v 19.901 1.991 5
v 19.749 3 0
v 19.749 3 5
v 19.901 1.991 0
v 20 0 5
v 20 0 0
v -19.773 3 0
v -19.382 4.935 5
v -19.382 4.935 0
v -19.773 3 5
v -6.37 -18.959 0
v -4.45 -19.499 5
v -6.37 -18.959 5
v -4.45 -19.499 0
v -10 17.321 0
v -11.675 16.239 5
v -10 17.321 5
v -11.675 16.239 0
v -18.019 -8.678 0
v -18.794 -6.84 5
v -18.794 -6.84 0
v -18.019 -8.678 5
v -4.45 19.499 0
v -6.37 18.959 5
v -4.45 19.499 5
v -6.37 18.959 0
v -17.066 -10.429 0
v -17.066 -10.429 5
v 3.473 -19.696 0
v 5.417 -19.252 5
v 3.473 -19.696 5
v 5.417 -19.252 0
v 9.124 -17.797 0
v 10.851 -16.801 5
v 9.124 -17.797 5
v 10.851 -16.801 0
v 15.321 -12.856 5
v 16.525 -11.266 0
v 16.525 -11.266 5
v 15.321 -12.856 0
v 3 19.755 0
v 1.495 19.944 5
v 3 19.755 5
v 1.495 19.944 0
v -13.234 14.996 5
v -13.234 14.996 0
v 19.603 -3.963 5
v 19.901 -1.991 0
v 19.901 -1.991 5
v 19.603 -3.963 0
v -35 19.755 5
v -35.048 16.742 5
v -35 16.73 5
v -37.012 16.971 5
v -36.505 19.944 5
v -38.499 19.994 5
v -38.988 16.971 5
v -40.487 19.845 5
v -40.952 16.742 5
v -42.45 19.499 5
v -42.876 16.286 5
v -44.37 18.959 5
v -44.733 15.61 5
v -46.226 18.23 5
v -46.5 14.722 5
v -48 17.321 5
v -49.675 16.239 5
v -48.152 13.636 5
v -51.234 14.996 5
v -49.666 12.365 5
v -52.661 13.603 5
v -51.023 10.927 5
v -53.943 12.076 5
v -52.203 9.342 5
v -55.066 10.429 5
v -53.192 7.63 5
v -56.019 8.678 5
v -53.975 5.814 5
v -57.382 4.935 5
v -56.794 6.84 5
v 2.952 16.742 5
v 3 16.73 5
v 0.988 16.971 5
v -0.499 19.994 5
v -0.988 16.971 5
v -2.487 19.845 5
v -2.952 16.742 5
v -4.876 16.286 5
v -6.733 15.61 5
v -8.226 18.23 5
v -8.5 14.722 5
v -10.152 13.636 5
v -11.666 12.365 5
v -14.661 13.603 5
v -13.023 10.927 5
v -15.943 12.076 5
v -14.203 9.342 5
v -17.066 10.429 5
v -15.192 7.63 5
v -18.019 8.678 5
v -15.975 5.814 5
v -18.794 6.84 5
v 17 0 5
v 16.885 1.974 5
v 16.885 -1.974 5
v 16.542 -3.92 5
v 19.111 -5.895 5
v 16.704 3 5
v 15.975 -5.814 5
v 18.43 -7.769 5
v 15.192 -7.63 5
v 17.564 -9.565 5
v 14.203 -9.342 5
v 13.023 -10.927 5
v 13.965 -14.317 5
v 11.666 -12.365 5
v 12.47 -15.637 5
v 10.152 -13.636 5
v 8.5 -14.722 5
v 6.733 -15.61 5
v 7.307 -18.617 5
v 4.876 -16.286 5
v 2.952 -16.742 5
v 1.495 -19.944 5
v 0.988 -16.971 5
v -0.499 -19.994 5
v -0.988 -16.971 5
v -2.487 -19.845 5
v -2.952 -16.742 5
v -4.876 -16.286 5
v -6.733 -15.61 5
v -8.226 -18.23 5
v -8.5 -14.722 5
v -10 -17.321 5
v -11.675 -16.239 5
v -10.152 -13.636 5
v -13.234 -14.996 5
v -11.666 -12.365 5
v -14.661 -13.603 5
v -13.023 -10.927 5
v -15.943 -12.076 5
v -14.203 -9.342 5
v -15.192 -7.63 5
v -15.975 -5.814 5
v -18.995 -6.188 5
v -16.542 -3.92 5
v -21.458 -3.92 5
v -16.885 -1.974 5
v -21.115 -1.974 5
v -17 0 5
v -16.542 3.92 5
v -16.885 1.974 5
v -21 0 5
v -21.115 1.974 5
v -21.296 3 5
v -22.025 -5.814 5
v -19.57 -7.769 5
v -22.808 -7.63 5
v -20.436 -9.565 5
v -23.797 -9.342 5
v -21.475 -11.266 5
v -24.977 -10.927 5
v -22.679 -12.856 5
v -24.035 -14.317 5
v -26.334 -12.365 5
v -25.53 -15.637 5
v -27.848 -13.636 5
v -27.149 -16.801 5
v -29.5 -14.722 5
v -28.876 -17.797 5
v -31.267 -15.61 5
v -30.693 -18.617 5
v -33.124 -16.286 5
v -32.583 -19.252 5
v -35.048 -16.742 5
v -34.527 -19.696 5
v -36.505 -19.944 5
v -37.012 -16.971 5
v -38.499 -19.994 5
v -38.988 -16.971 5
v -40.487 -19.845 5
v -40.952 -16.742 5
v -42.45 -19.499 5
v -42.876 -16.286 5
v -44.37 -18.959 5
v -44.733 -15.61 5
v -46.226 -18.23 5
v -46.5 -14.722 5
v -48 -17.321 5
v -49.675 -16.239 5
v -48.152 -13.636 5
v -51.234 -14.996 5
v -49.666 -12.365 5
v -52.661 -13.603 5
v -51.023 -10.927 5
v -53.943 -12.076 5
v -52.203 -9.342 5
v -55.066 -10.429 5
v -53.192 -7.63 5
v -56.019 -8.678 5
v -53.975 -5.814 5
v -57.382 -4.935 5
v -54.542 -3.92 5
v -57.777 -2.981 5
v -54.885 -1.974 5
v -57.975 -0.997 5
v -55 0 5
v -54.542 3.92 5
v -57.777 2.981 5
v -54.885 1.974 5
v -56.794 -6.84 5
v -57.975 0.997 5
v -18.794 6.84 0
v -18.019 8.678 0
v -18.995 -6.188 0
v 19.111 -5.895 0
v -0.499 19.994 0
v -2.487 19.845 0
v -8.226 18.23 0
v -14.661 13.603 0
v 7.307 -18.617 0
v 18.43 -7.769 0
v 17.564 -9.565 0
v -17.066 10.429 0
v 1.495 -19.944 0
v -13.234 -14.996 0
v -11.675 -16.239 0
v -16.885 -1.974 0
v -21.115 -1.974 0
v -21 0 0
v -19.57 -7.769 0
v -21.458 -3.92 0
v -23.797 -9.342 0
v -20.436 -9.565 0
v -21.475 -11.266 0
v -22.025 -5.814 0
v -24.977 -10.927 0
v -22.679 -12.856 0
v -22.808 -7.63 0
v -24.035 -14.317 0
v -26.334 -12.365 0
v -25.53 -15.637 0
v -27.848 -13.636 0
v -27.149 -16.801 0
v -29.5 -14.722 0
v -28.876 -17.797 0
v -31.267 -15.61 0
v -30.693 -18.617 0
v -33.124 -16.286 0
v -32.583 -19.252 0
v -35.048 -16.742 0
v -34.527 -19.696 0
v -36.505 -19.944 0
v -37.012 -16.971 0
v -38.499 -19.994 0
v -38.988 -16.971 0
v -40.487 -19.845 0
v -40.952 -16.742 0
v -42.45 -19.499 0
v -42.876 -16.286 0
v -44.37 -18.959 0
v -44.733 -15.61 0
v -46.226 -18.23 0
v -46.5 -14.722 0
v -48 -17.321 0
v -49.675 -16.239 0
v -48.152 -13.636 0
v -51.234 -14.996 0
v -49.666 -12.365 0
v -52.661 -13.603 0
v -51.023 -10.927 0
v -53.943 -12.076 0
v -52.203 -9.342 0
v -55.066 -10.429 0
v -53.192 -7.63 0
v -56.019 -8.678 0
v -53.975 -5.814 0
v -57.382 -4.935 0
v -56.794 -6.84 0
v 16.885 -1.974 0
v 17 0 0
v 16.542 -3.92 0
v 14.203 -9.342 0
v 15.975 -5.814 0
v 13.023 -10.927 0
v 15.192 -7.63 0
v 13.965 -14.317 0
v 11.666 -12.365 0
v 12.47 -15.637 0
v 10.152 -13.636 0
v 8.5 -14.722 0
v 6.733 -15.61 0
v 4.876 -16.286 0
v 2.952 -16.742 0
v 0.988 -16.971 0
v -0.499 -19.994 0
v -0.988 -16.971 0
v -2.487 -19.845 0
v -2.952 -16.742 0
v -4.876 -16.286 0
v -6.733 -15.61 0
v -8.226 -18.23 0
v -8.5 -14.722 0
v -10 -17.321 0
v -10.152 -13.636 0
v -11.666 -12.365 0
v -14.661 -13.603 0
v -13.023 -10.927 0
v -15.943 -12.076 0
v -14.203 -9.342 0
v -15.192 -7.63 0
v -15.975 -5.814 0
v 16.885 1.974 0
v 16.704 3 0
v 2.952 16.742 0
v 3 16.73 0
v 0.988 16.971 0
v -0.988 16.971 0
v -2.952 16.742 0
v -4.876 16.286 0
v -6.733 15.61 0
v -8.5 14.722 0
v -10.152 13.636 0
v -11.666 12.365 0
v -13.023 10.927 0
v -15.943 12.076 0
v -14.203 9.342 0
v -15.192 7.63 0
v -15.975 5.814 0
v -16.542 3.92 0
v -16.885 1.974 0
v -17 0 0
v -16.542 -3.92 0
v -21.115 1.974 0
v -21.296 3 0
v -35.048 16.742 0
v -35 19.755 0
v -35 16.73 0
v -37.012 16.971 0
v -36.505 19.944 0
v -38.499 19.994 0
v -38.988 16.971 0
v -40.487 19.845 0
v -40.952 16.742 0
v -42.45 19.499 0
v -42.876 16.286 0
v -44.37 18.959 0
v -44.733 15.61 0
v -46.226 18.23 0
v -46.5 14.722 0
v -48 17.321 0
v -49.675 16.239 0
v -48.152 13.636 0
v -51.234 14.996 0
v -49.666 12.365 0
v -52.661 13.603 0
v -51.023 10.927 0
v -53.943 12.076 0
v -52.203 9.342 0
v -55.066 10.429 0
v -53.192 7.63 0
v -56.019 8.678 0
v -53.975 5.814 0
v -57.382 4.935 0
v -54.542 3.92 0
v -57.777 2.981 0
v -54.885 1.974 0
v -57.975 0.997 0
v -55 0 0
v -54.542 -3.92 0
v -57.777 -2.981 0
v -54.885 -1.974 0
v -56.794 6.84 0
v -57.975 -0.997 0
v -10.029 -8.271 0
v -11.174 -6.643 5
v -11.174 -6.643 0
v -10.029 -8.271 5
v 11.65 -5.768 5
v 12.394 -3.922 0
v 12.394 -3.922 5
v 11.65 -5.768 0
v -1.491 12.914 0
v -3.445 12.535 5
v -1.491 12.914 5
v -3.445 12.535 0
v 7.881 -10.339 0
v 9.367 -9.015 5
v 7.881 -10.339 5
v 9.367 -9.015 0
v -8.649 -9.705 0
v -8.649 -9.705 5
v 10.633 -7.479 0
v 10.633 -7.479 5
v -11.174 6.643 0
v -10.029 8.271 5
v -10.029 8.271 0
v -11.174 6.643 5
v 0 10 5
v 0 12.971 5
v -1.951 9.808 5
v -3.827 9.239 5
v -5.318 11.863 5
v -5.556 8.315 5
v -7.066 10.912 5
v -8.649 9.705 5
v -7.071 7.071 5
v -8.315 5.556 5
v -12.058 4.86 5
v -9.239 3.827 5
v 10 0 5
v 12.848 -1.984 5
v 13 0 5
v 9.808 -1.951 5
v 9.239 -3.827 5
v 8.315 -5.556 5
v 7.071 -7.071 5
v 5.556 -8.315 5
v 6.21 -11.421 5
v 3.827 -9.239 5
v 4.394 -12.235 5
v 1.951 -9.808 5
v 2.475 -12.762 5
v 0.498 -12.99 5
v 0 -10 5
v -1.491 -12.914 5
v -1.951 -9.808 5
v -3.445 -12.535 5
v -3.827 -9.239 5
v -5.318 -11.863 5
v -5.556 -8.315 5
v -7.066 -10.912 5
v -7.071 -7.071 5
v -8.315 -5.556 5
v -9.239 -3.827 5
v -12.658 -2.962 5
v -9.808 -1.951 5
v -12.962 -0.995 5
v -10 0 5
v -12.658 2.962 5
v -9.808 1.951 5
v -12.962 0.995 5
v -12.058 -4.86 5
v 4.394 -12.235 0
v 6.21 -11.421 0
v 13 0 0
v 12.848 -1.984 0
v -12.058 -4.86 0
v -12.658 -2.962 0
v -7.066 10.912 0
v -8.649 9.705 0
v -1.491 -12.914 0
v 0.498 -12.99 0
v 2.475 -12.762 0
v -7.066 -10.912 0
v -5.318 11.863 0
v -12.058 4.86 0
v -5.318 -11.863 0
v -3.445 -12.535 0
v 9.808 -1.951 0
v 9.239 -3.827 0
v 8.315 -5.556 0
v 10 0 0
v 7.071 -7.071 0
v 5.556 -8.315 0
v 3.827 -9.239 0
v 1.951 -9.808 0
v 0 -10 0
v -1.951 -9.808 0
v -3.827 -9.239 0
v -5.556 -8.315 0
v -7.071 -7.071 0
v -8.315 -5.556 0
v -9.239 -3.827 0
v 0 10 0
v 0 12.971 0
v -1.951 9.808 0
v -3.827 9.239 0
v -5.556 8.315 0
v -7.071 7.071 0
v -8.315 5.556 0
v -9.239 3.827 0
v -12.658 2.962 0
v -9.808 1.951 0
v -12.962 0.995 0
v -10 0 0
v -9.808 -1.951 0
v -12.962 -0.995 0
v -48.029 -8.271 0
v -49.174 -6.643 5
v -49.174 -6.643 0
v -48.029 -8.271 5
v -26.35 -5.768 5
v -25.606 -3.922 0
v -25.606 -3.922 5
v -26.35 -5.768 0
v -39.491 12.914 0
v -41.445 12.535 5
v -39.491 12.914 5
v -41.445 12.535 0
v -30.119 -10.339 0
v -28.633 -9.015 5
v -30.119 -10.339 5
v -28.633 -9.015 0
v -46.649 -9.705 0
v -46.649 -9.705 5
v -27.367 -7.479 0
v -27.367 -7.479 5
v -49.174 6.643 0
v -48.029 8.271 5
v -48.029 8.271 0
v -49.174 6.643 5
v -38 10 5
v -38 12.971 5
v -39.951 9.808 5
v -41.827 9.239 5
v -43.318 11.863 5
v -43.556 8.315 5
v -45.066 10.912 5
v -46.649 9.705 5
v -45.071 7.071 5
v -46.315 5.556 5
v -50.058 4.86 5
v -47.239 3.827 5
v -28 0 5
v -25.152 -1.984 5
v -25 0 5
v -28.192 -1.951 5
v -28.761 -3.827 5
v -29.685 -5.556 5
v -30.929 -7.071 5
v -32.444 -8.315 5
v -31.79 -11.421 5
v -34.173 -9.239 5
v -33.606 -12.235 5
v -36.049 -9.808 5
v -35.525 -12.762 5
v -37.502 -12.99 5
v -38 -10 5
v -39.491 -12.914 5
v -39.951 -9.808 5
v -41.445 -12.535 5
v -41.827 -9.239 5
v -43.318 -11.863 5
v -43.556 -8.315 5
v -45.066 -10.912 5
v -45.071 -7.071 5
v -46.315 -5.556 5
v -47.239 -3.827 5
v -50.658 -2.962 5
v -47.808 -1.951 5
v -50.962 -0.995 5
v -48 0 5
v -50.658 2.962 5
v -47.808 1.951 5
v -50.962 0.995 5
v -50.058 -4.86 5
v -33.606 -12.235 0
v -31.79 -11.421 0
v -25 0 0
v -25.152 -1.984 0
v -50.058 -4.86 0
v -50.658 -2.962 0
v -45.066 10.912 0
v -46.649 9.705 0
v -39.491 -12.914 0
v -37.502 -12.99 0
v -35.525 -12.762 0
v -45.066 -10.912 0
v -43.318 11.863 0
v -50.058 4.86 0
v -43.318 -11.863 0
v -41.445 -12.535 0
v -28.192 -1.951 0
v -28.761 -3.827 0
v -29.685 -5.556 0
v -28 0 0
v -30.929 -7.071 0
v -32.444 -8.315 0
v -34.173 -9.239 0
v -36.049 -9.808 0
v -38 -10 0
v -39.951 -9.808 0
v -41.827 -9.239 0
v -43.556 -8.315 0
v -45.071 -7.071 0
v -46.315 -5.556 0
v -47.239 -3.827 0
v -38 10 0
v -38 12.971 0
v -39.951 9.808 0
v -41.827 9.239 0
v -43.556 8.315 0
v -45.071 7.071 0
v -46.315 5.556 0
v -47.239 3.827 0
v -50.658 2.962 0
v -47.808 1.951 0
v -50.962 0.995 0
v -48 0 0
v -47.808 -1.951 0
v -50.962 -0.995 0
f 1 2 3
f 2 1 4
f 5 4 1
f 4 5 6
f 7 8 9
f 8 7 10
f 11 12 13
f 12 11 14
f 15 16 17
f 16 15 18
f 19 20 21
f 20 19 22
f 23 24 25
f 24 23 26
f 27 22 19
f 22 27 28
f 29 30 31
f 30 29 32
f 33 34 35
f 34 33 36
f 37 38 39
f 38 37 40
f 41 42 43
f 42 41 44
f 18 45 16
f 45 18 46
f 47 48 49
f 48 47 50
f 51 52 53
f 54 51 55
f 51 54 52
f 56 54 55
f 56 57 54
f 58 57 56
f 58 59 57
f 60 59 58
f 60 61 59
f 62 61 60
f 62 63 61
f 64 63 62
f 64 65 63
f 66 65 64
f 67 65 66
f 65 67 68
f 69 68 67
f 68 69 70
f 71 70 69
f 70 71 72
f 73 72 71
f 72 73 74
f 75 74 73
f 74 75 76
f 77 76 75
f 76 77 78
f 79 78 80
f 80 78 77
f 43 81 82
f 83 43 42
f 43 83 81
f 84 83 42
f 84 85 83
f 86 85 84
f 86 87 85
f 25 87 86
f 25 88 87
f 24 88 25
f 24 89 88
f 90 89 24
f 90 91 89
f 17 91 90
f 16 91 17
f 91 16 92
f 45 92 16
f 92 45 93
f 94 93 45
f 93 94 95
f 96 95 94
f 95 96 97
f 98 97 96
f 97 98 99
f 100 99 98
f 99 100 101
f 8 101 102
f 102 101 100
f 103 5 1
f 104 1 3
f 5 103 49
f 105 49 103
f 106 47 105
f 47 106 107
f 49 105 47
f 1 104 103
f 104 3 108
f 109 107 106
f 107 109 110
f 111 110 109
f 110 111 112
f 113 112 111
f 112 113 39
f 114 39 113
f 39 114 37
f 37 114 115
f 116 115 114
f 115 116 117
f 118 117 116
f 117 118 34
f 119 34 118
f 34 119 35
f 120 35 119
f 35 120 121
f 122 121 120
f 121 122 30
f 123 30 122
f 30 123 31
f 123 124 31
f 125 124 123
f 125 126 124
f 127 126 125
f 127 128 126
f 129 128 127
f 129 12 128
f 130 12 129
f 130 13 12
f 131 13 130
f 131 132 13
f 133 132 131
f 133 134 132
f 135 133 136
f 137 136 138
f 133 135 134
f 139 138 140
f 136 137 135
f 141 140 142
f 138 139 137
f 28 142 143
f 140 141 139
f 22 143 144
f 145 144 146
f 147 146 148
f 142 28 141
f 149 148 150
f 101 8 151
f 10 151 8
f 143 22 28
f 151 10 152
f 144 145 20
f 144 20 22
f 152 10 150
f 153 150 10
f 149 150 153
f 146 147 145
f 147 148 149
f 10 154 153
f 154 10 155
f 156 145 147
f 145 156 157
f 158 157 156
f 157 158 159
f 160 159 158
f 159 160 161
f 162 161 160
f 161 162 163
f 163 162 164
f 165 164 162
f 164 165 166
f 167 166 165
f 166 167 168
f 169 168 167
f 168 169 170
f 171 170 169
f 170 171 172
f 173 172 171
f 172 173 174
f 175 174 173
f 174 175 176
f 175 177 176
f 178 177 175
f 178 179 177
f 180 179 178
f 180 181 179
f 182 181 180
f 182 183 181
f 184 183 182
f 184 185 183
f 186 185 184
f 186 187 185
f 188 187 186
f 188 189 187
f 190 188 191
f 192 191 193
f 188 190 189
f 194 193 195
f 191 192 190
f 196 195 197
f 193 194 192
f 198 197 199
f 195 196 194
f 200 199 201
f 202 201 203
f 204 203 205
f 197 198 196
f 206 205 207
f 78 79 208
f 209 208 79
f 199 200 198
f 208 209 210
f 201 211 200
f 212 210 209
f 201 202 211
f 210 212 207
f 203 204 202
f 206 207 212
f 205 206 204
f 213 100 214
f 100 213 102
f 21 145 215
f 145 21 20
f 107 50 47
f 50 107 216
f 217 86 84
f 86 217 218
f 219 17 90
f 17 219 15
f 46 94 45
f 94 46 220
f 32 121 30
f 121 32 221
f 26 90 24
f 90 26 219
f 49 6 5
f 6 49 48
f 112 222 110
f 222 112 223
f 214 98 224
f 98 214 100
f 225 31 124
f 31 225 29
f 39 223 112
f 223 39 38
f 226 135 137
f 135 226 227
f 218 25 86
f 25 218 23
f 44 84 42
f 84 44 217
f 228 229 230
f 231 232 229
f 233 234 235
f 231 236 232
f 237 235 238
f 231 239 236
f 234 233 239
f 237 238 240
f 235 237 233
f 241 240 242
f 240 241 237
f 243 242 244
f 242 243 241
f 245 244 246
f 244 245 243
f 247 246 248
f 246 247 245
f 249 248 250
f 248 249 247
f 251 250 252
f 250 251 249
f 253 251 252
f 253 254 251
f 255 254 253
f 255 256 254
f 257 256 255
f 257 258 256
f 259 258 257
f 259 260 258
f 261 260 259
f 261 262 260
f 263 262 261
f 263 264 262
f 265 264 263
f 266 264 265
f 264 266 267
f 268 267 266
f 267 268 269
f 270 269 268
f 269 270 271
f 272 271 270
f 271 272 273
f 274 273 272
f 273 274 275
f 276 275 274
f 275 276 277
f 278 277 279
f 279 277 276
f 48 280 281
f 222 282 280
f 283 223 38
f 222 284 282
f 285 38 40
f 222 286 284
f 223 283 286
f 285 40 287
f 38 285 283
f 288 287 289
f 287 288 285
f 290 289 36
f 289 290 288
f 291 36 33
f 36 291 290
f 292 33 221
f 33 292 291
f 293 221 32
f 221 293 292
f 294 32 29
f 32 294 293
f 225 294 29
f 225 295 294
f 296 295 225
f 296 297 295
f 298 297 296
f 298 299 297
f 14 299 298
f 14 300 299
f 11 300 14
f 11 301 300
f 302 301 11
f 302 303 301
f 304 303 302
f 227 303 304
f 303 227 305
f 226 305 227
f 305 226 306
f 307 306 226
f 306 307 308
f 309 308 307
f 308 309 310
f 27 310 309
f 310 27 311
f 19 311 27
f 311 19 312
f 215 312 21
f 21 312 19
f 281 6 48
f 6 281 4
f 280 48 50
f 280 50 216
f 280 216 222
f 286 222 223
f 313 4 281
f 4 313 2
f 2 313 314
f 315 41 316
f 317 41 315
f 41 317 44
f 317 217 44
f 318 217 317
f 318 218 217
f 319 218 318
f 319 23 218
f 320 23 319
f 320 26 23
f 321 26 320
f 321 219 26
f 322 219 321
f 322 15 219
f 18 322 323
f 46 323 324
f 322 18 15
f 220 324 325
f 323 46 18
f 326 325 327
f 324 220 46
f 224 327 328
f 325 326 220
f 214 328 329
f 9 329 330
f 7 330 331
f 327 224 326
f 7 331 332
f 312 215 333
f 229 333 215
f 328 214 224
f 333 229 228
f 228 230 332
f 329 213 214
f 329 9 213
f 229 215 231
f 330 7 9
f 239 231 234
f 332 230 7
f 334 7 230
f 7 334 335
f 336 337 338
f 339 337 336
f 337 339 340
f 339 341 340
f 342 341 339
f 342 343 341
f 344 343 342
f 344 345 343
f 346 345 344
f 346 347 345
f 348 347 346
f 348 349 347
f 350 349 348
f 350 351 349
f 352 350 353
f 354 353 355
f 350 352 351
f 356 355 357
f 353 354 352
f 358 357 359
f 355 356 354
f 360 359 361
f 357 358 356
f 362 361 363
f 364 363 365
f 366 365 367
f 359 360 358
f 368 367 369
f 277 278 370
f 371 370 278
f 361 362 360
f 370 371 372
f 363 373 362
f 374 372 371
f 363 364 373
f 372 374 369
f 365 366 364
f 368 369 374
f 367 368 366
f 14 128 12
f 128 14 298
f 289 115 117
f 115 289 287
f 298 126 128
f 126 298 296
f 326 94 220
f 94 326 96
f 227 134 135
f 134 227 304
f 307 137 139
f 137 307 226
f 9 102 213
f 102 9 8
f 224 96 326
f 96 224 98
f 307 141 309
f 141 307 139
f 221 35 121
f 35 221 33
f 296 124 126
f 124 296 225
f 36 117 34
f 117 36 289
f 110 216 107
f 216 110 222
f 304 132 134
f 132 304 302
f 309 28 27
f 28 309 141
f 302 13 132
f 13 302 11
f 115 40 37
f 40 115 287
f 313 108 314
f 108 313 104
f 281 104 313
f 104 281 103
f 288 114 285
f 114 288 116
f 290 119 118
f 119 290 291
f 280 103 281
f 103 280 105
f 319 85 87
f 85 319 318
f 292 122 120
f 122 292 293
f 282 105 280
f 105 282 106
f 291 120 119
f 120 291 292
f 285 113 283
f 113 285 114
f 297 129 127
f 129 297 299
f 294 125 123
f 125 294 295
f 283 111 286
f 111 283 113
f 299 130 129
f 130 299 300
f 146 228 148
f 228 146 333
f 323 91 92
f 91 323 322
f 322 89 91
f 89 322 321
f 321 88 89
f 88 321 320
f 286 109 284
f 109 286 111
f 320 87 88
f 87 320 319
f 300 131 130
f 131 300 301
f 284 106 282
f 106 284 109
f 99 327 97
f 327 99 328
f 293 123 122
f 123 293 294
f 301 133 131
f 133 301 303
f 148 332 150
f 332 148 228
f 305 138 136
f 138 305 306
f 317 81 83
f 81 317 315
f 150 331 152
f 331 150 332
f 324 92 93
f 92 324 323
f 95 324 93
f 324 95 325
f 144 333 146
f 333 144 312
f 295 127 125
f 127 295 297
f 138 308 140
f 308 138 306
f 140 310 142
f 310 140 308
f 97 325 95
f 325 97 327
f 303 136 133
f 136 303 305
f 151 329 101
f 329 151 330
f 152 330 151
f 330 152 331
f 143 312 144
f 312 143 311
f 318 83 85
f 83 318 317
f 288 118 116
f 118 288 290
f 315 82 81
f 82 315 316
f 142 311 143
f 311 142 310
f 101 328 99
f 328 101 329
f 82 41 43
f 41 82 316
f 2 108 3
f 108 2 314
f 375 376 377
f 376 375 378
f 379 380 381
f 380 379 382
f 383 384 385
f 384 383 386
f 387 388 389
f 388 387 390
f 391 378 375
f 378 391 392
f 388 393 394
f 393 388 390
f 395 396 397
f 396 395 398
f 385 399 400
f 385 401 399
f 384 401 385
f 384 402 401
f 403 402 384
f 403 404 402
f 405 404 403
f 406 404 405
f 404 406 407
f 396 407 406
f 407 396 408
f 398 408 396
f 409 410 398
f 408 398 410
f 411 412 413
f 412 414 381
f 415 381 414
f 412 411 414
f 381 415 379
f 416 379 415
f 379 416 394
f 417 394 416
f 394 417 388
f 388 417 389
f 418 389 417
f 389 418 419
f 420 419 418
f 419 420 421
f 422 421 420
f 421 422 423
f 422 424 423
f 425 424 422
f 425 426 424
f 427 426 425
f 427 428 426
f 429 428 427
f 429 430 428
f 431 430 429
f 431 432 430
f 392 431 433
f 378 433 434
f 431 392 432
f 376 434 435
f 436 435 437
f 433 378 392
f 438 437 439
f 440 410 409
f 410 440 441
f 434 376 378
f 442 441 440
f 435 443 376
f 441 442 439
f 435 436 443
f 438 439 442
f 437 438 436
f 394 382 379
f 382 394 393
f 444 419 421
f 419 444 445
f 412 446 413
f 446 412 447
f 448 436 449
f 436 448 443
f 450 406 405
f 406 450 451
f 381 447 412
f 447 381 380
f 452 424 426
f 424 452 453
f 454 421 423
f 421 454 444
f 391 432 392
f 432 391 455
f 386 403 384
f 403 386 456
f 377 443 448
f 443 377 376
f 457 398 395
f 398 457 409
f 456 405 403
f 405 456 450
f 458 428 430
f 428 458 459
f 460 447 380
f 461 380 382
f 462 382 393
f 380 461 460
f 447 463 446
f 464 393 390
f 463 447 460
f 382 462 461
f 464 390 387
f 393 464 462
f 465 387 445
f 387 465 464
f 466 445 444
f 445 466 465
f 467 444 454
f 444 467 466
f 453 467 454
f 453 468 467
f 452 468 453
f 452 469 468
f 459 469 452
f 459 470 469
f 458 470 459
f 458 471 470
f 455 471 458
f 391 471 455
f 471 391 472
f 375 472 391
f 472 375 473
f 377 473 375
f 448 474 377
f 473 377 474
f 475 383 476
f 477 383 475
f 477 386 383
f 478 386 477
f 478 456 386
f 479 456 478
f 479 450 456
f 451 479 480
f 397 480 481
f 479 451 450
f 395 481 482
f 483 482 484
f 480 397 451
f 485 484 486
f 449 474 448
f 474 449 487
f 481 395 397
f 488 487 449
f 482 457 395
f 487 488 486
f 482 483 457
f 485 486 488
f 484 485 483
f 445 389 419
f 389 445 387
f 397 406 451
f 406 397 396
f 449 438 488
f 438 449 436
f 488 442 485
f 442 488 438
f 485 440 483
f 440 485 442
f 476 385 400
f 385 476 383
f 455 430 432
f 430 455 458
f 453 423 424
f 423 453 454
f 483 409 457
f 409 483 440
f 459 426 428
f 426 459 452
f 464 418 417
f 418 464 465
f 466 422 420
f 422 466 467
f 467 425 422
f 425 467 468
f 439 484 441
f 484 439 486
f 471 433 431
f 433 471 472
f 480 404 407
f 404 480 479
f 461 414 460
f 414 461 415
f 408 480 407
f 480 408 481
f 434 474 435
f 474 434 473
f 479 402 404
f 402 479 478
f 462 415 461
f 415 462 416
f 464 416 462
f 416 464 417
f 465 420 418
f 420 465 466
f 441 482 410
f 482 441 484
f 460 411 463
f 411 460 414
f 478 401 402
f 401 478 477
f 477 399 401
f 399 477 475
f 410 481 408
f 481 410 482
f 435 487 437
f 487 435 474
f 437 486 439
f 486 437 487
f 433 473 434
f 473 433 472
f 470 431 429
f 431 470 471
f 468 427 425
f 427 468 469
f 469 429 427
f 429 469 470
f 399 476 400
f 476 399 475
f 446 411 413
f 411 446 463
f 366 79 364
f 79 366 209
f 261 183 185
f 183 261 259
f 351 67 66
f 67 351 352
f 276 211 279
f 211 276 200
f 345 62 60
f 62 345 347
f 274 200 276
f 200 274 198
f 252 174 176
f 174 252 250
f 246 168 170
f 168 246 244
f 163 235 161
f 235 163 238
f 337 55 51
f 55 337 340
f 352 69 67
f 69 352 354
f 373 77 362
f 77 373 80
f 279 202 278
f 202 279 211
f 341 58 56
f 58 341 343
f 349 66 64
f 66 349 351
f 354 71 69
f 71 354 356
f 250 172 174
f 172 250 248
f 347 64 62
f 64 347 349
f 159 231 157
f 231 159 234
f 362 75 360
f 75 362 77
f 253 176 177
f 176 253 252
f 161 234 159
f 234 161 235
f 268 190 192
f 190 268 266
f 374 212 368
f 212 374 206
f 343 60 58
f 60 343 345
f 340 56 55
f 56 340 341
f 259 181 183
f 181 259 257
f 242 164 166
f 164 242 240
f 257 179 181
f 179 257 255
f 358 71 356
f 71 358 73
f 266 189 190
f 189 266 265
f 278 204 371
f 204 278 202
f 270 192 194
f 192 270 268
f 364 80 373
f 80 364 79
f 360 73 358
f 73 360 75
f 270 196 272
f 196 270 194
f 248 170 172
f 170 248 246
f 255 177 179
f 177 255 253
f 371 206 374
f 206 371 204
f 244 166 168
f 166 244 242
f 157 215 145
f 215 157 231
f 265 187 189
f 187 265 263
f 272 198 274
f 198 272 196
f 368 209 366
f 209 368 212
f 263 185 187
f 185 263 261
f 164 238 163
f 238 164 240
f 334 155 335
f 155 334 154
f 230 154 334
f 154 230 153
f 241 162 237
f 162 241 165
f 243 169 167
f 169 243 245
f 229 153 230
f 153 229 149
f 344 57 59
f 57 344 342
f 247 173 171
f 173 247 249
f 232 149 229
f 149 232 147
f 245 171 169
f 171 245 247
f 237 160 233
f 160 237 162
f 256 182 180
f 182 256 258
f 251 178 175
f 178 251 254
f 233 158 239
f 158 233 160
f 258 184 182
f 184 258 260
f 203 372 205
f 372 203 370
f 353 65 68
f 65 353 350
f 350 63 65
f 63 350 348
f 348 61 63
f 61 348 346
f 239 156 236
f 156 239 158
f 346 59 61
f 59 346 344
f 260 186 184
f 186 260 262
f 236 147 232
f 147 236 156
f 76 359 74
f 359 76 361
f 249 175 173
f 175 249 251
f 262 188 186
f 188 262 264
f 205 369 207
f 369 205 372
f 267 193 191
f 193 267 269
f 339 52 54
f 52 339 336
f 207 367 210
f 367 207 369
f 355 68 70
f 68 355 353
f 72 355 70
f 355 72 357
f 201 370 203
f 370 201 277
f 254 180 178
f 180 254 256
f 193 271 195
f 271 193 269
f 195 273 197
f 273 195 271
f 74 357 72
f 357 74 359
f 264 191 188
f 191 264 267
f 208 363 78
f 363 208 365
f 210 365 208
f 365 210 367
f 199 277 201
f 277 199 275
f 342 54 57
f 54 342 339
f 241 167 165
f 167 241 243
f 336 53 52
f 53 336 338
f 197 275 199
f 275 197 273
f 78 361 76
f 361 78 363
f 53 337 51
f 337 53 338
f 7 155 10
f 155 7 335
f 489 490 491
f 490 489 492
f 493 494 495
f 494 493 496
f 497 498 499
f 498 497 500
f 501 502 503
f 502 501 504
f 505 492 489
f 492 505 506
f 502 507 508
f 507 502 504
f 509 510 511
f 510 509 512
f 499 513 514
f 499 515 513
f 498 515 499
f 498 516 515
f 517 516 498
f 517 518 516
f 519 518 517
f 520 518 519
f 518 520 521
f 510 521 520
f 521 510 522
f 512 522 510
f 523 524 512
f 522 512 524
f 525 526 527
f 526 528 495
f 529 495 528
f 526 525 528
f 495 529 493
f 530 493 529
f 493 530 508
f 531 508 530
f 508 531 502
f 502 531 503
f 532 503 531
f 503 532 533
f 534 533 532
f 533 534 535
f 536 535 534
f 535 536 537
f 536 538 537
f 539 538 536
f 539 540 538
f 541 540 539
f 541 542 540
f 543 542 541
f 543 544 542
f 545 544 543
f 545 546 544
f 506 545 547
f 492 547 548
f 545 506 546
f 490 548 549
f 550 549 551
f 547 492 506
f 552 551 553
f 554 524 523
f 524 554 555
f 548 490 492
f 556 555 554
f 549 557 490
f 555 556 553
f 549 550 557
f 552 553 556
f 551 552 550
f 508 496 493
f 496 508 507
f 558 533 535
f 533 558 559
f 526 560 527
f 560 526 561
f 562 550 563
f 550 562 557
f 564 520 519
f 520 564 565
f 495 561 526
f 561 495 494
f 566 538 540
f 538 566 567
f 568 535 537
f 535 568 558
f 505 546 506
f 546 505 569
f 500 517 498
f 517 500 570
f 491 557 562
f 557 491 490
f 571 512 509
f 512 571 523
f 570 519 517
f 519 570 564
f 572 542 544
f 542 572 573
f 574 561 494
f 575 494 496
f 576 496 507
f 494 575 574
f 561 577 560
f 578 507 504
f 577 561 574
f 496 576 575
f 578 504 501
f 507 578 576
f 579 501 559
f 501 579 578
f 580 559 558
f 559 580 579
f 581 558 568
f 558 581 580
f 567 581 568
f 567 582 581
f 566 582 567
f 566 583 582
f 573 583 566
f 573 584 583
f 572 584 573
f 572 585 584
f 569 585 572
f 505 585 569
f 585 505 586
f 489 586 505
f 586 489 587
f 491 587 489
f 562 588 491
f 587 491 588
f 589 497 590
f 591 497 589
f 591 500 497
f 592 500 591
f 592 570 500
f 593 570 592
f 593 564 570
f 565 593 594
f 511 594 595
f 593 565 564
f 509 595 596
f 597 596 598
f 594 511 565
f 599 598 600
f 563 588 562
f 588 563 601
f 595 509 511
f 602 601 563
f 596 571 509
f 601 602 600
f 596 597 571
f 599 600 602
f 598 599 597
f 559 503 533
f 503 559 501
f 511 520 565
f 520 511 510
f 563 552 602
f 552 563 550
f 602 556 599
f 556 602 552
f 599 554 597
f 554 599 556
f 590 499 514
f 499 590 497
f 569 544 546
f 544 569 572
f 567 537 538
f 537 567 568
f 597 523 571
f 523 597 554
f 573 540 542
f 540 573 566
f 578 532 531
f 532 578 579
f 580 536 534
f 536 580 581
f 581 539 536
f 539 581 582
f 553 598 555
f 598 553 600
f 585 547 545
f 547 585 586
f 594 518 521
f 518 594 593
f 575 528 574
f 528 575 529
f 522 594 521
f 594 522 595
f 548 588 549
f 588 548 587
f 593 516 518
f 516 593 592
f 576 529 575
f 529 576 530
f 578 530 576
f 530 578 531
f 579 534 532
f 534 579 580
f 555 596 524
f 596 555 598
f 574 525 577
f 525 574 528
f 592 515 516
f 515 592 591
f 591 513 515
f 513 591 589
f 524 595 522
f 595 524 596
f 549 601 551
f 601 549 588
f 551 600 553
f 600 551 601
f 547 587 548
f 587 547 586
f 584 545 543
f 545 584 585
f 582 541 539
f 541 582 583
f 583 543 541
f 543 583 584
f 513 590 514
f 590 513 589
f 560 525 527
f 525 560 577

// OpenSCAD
// Copyright 2018 Infinnovation Ltd.
//
// Generate an "infinity" like symbol using OpenSCAD
//
// Concept : Pairs of C style shapes nested, rotated.
//
// Formed from outer cyclinder, subtract inner cylinder and cube.
//
// Tip : to see cube, add the #debug modifier, thus s/cube/#cube/.

module createC (x,y,z,r,o,w,a)
{
  translate ([x,y,z]) rotate ([0,0,a]) difference ()
  {
    cylinder (5,r,r,$fa=5);
    translate ([0,0,-1]) cylinder (7,r-w,r-w,$fa=5);
    translate ([o,o,-1]) cube ([r+1,r+1,7]);
  }
}

// Original parameters

//createC(-38,0,0,20,3,3,-60);
//createC(-38,0,0,13,0,3,-18);
//createC(0,0,0,20,3,3,115);
//createC(0,0,0,13,0,3,158);

// Demonstrate the formation of the shape as the rotation proceeds
// Apply animation feature.

module cpair(x,y,z,w, rb, rl, ob, ol, ab, al) 
{
    createC(x,y,z,rb,ob,w,ab);
    createC(x,y,z,rl,ol,w,al);
}

function alpha(t,i) = 115*t;
function beta(t,i) = (158-360)*t;

cpair(0,0,0,3,20,13,3,0,alpha($t,0),beta($t,1));

function gamma(t,i) = -60*t;
function delta(t,i) = (-18-360)*t;
//color("red")

cpair(-38,0,0,3,20,13,3,0,gamma($t,0),delta($t,1));

// To generate an mp4 : use the "dump frames feature"
//
// Then e.g.
//
// ffmpeg -r 50 -i frame%05d.png -vcodec libx264 -crf 25 logo.mp4


    
